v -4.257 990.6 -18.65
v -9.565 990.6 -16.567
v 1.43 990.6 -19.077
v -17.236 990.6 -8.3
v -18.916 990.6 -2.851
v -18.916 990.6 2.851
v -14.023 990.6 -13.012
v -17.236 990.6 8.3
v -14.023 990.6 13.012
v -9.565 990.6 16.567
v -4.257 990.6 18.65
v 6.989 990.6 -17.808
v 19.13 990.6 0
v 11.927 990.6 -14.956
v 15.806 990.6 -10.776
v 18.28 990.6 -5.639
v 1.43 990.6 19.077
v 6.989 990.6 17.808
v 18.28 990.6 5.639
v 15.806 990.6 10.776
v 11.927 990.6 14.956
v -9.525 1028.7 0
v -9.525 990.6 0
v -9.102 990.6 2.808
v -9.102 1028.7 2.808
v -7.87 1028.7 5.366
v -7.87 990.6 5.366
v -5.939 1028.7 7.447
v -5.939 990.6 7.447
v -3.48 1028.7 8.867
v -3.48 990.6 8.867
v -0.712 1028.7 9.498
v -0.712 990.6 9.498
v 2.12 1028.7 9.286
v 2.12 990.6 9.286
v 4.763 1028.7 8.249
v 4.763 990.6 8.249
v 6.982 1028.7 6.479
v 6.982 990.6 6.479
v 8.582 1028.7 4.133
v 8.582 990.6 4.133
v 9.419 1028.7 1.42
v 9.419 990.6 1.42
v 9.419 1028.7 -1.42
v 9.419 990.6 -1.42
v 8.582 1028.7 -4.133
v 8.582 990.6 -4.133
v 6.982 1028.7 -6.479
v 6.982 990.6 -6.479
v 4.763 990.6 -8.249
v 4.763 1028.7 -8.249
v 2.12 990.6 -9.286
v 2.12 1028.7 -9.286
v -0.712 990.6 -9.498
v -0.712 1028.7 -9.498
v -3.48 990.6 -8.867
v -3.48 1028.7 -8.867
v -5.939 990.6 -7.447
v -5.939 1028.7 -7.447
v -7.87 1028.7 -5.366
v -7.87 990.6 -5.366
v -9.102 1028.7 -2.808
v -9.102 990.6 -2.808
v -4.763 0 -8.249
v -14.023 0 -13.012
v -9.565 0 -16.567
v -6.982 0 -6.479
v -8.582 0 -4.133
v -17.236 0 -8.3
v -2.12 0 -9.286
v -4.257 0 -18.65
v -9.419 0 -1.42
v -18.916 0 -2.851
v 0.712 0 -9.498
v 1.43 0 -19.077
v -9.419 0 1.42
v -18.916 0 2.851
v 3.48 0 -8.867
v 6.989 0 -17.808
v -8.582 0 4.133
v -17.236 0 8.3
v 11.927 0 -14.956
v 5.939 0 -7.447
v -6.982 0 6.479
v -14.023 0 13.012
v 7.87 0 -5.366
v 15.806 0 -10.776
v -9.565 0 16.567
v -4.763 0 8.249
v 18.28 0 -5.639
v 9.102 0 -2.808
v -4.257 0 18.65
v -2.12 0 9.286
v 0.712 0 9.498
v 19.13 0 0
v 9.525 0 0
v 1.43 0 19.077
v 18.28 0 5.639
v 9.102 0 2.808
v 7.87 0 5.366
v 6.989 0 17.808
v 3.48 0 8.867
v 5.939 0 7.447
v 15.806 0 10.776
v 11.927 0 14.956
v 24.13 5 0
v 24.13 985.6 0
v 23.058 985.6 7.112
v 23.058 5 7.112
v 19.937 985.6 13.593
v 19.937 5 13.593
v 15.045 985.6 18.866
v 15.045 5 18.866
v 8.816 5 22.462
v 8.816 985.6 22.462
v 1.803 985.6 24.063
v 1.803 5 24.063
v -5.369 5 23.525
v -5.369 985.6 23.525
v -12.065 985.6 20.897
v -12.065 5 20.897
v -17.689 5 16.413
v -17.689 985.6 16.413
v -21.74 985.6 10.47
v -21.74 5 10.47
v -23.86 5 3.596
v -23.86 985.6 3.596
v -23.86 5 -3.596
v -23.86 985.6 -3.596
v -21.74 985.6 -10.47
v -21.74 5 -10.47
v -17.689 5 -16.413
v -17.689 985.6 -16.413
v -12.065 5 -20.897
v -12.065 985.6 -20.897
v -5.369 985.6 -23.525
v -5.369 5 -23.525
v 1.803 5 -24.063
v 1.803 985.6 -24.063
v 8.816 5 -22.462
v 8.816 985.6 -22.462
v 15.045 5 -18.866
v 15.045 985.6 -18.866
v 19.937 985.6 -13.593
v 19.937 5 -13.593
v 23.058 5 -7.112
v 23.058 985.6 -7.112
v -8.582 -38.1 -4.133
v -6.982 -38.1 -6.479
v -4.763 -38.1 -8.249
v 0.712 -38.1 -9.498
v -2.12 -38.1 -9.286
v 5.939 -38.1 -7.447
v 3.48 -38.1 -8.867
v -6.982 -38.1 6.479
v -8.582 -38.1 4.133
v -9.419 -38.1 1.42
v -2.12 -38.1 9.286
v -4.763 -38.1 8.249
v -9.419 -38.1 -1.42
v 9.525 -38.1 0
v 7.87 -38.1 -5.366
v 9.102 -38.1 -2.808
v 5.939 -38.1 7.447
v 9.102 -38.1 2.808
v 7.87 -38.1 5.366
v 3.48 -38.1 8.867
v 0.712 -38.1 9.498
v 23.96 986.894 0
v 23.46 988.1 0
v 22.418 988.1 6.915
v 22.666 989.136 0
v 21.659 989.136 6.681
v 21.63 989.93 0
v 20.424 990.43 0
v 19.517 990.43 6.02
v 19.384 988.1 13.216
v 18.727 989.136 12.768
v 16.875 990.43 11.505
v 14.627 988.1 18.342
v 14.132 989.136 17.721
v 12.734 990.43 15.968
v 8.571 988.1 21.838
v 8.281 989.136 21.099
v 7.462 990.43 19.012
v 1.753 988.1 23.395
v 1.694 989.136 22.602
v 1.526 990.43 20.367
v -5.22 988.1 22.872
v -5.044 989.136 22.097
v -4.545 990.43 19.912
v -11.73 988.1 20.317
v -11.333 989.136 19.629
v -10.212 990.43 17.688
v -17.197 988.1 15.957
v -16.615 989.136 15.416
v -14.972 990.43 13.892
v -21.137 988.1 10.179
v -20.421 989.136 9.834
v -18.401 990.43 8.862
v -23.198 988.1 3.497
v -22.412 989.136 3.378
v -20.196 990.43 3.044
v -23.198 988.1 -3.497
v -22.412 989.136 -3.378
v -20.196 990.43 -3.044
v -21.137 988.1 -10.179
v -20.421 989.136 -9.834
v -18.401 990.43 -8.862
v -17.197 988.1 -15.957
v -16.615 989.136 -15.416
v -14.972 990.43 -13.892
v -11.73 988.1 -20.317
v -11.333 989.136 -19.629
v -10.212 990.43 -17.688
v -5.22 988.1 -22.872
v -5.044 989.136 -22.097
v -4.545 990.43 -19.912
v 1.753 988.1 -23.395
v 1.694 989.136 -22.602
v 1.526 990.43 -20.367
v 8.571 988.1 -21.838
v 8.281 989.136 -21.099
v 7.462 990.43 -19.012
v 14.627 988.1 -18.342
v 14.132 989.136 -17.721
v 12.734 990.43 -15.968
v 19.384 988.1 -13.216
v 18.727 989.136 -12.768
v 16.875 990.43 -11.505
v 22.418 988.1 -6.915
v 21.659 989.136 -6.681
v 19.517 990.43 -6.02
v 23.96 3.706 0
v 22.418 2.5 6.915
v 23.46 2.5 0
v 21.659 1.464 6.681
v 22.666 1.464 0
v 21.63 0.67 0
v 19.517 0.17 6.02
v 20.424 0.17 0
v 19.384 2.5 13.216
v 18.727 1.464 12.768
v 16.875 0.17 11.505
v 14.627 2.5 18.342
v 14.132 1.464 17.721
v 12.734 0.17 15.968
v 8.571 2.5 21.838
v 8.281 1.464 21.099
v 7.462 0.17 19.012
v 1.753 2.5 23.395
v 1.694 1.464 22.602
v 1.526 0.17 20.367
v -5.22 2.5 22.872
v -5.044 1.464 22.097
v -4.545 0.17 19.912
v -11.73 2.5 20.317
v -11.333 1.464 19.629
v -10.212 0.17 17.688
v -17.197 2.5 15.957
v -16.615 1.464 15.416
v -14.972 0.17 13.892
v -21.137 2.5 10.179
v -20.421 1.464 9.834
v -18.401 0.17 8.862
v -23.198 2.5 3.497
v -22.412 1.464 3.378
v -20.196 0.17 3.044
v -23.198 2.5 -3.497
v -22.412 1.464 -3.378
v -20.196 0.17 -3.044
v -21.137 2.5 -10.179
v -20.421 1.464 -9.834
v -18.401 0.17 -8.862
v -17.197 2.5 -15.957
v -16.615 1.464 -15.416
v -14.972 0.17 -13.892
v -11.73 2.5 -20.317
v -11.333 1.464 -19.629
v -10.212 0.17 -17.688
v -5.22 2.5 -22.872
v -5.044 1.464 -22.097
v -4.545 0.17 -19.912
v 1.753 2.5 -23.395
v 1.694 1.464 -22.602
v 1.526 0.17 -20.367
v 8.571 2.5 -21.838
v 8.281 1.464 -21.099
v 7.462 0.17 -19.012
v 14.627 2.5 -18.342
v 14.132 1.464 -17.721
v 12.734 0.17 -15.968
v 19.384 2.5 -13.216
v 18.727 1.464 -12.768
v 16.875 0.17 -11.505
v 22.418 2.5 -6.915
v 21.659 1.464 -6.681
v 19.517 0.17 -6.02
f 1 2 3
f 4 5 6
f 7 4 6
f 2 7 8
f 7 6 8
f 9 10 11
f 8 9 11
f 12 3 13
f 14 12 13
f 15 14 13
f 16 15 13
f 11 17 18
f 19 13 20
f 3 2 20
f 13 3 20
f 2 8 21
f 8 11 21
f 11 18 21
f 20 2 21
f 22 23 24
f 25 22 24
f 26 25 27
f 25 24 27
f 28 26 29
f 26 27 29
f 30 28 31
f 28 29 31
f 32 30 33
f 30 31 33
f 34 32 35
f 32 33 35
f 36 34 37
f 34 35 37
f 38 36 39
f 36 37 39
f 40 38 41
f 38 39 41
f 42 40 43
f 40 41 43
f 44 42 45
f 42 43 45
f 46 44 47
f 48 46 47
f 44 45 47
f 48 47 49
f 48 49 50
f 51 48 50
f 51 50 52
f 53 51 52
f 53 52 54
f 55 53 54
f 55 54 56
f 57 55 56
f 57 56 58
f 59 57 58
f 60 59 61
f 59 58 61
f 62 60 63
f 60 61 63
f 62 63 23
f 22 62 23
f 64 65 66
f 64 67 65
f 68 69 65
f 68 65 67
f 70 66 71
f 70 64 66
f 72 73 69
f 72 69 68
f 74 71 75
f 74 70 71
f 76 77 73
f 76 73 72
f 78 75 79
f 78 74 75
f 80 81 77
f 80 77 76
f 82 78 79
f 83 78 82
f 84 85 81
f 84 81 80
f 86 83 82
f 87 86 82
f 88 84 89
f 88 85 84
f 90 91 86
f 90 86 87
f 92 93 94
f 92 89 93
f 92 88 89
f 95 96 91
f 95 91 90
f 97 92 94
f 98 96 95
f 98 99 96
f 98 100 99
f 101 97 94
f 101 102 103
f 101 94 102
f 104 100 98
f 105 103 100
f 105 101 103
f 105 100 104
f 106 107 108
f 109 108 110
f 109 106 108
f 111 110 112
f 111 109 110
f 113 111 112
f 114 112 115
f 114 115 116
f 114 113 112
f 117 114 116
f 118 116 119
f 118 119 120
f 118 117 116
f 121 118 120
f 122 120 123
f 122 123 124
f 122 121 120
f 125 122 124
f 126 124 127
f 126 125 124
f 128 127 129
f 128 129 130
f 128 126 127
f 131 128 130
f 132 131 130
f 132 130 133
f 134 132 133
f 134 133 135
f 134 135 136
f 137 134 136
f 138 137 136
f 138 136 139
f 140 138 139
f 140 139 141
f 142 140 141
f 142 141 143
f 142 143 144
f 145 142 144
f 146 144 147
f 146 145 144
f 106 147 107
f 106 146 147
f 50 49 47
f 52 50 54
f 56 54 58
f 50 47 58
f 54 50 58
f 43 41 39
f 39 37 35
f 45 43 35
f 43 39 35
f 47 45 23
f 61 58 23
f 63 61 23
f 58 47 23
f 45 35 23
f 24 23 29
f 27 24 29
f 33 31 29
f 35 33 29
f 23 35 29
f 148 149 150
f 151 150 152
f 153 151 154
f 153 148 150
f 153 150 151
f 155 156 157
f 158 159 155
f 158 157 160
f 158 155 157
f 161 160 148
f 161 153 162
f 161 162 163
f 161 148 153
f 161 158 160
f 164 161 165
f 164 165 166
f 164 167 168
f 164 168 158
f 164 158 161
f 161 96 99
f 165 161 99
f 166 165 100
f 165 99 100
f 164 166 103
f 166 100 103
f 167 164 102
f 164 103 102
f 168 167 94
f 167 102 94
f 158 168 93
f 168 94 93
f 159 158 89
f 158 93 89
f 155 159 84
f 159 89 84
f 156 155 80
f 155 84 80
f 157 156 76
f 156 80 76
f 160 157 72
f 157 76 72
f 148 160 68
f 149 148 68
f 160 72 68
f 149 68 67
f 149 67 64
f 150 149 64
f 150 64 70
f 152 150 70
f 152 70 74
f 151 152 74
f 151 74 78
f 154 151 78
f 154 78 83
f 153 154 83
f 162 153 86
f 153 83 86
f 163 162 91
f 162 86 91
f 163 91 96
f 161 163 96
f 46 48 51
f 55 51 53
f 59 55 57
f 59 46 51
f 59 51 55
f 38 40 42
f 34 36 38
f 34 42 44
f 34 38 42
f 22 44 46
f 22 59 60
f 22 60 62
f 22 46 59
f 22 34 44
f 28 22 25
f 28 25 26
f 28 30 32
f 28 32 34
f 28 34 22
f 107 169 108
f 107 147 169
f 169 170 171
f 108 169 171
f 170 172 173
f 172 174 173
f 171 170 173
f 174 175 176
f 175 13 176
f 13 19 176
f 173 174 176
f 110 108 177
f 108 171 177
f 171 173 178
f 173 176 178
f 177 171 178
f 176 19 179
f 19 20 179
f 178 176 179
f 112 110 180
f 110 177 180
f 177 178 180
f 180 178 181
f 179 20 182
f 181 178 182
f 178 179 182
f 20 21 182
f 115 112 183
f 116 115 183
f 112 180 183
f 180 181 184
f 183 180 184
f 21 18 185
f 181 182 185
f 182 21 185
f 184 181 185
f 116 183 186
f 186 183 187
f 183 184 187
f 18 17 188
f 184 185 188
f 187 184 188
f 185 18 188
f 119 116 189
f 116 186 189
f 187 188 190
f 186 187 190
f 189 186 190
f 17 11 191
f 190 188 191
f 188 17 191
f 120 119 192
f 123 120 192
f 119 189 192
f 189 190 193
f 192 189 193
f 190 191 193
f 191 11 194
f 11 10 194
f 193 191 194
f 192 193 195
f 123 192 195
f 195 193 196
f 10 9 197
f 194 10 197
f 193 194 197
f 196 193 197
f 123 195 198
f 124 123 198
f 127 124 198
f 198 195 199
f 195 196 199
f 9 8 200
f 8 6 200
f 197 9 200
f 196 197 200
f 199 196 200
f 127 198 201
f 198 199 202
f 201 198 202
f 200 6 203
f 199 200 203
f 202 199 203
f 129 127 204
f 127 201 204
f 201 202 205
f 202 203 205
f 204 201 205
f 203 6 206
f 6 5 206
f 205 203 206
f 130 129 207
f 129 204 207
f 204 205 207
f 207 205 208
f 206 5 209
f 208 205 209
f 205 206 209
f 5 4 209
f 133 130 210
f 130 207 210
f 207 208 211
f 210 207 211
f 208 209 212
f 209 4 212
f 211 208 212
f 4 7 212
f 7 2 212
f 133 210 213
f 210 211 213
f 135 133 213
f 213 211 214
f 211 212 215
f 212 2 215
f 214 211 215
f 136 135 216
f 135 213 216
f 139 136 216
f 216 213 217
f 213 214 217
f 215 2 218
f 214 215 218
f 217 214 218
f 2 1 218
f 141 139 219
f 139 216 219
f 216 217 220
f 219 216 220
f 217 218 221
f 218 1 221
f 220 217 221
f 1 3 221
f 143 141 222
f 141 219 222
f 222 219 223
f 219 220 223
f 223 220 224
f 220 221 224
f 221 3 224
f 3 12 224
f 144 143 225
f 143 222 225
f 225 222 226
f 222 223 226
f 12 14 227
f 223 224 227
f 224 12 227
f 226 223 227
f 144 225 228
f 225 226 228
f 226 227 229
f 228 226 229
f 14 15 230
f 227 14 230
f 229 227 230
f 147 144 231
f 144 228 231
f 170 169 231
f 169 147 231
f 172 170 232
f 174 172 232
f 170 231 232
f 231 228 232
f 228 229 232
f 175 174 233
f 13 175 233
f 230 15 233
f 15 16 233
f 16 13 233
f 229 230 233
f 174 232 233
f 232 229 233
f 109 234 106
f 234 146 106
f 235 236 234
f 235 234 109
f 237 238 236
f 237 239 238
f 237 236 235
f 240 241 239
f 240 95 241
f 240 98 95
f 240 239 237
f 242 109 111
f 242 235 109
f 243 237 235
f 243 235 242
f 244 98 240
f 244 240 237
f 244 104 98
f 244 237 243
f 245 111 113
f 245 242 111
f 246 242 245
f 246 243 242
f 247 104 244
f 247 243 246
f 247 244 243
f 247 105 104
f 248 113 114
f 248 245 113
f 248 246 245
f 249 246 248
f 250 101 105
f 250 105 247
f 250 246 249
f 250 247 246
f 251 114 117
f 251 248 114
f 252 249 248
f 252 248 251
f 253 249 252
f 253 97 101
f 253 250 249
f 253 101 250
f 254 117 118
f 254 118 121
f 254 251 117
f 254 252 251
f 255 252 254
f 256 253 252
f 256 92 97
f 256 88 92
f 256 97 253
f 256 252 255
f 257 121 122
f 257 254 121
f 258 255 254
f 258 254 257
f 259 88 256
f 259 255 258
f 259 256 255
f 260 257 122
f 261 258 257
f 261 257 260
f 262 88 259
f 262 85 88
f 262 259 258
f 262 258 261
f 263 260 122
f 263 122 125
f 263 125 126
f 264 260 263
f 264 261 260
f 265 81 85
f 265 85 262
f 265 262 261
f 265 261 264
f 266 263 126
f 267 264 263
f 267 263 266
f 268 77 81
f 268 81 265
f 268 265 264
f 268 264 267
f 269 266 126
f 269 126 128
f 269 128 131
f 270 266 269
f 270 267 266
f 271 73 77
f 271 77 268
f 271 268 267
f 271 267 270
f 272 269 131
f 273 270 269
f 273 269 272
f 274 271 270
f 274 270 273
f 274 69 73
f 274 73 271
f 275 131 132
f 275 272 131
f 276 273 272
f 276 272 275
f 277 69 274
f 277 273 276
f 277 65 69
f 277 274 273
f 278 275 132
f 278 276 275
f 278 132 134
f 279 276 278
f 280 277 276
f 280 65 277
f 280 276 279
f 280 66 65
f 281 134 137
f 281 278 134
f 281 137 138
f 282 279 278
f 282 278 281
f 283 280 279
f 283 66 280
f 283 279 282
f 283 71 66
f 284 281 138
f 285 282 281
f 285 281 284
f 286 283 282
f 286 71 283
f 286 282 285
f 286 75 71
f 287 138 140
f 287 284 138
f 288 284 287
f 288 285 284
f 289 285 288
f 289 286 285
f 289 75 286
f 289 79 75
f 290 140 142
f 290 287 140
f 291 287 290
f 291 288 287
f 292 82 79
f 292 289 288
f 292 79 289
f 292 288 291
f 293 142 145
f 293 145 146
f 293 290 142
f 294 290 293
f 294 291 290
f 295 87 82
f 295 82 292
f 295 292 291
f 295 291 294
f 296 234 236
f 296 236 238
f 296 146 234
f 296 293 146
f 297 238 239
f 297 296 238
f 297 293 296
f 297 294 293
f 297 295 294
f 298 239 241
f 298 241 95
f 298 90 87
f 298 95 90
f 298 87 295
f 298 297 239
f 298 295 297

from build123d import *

# Parameters (mm, degrees)
F0_R     = 24.13
F1_DEPTH = 990.6
F2_R     = 9.525
F3_DEPTH = 38.1
F4_R     = 9.525
F5_DEPTH = 38.1
F6_R     = 5


with BuildPart() as f1:
    # F0 (on Front) → F1 (new body)
    with BuildSketch(Plane.XZ):
        Circle(F0_R)
    extrude(amount=-F1_DEPTH)

    # F2 (on face) → F3 (join)
    with BuildSketch(Plane.XZ):
        Circle(F2_R)
    extrude(amount=F3_DEPTH)

    # F6
    f6_edges = [f1.edges().sort_by_distance(p)[0] for p in [
        (-24.13, 0, 0),
        (-24.13, 990.6, 0),
    ]]
    fillet(f6_edges, radius=F6_R)


with BuildPart() as f5:
    # F4 (on face) → F5 (new body)
    with BuildSketch(Plane(origin=(0, 990.6, 0), x_dir=(-1, 0, 0), z_dir=(0, 1, 0))):
        Circle(F4_R)
    extrude(amount=F5_DEPTH)


solid = Compound([f1.part, f5.part])
